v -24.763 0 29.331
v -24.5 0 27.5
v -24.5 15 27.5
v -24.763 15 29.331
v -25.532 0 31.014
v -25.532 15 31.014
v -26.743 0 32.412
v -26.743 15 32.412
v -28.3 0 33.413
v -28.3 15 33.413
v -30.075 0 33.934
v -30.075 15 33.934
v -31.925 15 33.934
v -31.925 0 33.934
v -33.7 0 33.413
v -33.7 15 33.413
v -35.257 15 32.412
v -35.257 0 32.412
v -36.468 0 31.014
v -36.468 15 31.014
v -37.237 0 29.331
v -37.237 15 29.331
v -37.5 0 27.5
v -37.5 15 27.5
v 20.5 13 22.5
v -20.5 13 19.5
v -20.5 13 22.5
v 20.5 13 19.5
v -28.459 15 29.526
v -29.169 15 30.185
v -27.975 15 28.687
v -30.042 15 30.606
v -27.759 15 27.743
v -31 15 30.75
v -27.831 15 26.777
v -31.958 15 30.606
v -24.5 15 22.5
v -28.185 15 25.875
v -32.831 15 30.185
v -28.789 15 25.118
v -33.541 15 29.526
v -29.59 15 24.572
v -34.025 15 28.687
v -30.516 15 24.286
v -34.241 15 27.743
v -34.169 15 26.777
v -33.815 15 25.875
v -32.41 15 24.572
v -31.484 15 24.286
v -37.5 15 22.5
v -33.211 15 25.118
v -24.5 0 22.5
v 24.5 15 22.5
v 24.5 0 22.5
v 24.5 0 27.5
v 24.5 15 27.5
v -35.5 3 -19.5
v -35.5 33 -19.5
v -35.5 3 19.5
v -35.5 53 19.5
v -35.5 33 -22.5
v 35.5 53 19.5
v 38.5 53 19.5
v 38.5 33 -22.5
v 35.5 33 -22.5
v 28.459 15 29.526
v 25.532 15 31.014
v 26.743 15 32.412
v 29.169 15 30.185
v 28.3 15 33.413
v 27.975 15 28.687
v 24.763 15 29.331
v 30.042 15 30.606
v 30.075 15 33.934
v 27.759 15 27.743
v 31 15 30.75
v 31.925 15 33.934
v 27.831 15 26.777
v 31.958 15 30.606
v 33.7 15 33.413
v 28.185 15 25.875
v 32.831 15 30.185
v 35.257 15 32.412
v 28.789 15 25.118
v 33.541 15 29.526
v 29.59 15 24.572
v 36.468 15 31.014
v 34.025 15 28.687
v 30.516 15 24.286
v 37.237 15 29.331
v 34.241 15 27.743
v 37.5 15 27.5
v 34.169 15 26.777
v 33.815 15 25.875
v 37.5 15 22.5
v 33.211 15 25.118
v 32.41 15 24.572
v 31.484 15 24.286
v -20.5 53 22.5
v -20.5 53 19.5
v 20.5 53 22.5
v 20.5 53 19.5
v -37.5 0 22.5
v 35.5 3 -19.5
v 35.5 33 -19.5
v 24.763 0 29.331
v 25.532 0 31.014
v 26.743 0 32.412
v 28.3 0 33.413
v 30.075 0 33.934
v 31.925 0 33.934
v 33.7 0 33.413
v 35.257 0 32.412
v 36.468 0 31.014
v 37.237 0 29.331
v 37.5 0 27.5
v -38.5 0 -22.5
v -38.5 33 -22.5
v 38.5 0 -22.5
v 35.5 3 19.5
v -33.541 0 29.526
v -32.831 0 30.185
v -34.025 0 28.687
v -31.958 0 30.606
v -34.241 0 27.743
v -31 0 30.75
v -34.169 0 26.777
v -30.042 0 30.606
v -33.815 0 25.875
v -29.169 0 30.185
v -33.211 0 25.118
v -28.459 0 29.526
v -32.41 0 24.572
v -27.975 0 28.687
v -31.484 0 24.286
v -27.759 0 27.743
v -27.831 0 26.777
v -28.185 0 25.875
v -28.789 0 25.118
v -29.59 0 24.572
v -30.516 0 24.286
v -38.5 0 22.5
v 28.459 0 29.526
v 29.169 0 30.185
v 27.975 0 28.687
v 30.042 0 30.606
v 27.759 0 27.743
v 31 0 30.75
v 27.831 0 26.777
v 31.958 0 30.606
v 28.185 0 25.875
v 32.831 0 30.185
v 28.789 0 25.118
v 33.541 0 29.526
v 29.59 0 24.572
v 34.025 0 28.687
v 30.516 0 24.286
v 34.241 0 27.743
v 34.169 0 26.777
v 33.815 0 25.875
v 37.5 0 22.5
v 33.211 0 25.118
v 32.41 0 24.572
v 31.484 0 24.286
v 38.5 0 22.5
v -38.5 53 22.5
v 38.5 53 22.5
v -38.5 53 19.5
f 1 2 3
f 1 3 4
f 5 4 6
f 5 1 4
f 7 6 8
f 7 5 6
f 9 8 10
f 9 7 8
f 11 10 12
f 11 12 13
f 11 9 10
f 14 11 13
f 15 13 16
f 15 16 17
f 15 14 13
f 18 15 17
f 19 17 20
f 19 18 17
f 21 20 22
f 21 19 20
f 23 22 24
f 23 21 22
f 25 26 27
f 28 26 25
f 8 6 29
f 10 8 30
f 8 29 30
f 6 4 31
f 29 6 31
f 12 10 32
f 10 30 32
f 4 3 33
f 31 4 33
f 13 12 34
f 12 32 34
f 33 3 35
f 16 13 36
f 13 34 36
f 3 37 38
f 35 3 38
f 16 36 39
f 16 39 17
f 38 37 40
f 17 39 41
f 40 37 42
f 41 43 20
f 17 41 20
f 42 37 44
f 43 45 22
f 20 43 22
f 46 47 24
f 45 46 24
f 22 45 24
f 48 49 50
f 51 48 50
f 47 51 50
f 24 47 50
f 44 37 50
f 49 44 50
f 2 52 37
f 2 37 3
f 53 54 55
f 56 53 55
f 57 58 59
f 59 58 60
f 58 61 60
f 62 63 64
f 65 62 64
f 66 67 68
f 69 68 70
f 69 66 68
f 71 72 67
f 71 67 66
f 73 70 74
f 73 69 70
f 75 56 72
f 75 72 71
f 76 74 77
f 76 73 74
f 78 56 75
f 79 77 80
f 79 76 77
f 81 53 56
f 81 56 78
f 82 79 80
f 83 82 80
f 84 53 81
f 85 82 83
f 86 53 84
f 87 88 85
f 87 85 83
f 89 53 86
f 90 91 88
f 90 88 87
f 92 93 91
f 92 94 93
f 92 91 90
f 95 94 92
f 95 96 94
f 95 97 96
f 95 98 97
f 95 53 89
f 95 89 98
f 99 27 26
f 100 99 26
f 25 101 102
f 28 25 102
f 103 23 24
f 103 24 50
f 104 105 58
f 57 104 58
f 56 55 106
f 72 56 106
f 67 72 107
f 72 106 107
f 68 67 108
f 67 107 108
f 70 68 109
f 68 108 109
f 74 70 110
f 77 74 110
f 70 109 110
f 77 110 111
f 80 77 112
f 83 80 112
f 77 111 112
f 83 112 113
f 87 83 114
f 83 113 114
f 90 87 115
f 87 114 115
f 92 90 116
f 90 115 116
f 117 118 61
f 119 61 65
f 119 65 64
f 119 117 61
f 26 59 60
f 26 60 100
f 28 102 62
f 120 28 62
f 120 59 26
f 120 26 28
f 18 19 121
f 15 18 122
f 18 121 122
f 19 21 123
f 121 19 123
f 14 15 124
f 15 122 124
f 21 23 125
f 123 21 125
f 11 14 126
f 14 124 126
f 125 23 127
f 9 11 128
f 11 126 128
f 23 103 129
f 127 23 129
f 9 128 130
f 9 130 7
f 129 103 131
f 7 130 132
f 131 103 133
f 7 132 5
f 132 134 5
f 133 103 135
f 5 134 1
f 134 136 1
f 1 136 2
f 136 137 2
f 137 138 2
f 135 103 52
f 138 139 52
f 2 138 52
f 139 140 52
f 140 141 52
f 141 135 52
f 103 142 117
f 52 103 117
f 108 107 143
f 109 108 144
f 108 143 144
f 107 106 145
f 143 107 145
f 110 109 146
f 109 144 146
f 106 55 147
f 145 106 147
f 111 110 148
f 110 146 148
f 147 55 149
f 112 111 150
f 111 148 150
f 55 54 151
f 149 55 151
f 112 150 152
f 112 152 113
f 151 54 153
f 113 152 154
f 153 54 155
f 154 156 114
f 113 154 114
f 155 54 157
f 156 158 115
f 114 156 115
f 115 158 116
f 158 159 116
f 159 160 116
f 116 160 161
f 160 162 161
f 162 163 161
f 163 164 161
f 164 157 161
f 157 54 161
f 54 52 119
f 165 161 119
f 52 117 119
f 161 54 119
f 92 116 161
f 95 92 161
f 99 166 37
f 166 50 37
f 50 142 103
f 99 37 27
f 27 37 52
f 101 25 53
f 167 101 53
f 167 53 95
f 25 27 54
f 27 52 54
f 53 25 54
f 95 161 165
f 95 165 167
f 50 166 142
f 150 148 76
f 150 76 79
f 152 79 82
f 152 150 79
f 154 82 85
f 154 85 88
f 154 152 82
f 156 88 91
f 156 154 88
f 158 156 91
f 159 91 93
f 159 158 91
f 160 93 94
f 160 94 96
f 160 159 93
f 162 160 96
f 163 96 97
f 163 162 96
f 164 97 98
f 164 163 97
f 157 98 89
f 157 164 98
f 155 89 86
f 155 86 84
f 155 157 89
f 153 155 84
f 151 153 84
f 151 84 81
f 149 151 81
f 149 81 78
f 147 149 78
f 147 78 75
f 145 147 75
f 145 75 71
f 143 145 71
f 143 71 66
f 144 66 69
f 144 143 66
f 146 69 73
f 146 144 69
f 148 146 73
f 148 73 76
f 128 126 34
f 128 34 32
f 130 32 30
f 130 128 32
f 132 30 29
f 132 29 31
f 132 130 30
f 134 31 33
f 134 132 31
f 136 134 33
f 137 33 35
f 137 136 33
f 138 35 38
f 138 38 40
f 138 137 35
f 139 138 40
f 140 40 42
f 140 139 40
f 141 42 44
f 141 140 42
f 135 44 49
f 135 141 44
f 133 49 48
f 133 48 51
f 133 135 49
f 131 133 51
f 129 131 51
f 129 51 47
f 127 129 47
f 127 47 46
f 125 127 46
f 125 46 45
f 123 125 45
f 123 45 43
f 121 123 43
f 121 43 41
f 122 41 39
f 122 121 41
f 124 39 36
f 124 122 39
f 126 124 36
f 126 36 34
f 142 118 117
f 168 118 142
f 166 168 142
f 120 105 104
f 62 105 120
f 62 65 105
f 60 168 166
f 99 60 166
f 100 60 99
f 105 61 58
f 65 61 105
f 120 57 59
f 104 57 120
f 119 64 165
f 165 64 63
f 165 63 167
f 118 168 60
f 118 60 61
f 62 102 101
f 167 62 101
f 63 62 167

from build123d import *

# Parameters (mm, degrees)
SKETCH_1_W          = 77
SKETCH_1_H          = 45
EXTRUDE_1_DEPTH     = 33
CUT_EXTRUDE_1_DEPTH = 30
SKETCH_5_W          = 18
SKETCH_5_H          = 3
EXTRUDE_3_DEPTH     = 20
EXTRUDE_4_DEPTH     = 3
SKETCH_8_W          = 41
SKETCH_8_H          = 3
EXTRUDE_6_DEPTH     = 10
SKETCH_4_R          = 3.25
EXTRUDE_2_DEPTH     = 15


with BuildPart() as part:
    # 草图1 → 凸台-拉伸1 (new body)
    with BuildSketch(Plane(origin=(0, 0, 0), x_dir=(1, 0, 0), z_dir=(0, 1, 0))):
        Rectangle(SKETCH_1_W, SKETCH_1_H)
    extrude(amount=EXTRUDE_1_DEPTH)

    # 草图2 → 切除-拉伸1 (cut)
    with BuildSketch(Plane(origin=(0, 33, 0), x_dir=(1, 0, 0), z_dir=(0, 1, 0))):
        Polygon((35.5, -19.5), (35.5, 19.5), (-35.5, 19.5), (-35.5, -19.5), (-20.5, -19.5), (-20.5, -22.5), (20.5, -22.5), (20.5, -19.5), align=None)
    extrude(amount=-CUT_EXTRUDE_1_DEPTH, mode=Mode.SUBTRACT)

    # 草图5 → 凸台-拉伸3 (add)
    with BuildSketch(Plane(origin=(0, 33, 0), x_dir=(1, 0, 0), z_dir=(0, 1, 0))):
        with Locations((-29.5, -21)):
            Rectangle(SKETCH_5_W, SKETCH_5_H)
        with Locations((29.5, -21)):
            Rectangle(SKETCH_5_W, SKETCH_5_H)
    extrude(amount=EXTRUDE_3_DEPTH)

    # 草图7 → 凸台-拉伸4 (add)
    with BuildSketch(Plane(origin=(38.5, 0, 0), x_dir=(0, 0, -1), z_dir=(1, 0, 0))):
        Polygon((22.5, 33), (-19.5, 33), (-19.5, 53), align=None)
    extrude_4 = extrude(amount=-EXTRUDE_4_DEPTH)

    # 镜向1: 凸台-拉伸4 across plane
    add(extrude_4.mirror(Plane(origin=(0, 0, 0), x_dir=(0, 0, 1), z_dir=(1, 0, 0))))

    # 草图8 → 凸台-拉伸6 (add)
    with BuildSketch(Plane(origin=(0, 3, 0), x_dir=(1, 0, 0), z_dir=(0, 1, 0))):
        with Locations((0, -21)):
            Rectangle(SKETCH_8_W, SKETCH_8_H)
    extrude(amount=EXTRUDE_6_DEPTH)

    # 草图4 → 凸台-拉伸2 (add)
    # profile 1 of 2: a face of its own
    with BuildSketch(Plane(origin=(0, 0, 0), x_dir=(1, 0, 0), z_dir=(0, 1, 0))):
        with BuildLine():
            Line((-37.5, -27.5), (-37.5, -22.5))
            Line((-37.5, -22.5), (-24.5, -22.5))
            Line((-24.5, -22.5), (-24.5, -27.5))
            ThreePointArc((-24.5, -27.5), (-31, -34), (-37.5, -27.5))
        make_face()
        with Locations(Location((-31, -27.5, 0), (0, 0, 270))):
            Circle(SKETCH_4_R, mode=Mode.SUBTRACT)
    # profile 2 of 2: a face of its own
    with BuildSketch(Plane(origin=(0, 0, 0), x_dir=(1, 0, 0), z_dir=(0, 1, 0))):
        with BuildLine():
            Line((37.5, -27.5), (37.5, -22.5))
            Line((37.5, -22.5), (24.5, -22.5))
            Line((24.5, -22.5), (24.5, -27.5))
            ThreePointArc((24.5, -27.5), (31, -34), (37.5, -27.5))
        make_face()
        with Locations(Location((31, -27.5, 0), (0, 0, 270))):
            Circle(SKETCH_4_R, mode=Mode.SUBTRACT)
    extrude(amount=EXTRUDE_2_DEPTH)


solid = part.part
